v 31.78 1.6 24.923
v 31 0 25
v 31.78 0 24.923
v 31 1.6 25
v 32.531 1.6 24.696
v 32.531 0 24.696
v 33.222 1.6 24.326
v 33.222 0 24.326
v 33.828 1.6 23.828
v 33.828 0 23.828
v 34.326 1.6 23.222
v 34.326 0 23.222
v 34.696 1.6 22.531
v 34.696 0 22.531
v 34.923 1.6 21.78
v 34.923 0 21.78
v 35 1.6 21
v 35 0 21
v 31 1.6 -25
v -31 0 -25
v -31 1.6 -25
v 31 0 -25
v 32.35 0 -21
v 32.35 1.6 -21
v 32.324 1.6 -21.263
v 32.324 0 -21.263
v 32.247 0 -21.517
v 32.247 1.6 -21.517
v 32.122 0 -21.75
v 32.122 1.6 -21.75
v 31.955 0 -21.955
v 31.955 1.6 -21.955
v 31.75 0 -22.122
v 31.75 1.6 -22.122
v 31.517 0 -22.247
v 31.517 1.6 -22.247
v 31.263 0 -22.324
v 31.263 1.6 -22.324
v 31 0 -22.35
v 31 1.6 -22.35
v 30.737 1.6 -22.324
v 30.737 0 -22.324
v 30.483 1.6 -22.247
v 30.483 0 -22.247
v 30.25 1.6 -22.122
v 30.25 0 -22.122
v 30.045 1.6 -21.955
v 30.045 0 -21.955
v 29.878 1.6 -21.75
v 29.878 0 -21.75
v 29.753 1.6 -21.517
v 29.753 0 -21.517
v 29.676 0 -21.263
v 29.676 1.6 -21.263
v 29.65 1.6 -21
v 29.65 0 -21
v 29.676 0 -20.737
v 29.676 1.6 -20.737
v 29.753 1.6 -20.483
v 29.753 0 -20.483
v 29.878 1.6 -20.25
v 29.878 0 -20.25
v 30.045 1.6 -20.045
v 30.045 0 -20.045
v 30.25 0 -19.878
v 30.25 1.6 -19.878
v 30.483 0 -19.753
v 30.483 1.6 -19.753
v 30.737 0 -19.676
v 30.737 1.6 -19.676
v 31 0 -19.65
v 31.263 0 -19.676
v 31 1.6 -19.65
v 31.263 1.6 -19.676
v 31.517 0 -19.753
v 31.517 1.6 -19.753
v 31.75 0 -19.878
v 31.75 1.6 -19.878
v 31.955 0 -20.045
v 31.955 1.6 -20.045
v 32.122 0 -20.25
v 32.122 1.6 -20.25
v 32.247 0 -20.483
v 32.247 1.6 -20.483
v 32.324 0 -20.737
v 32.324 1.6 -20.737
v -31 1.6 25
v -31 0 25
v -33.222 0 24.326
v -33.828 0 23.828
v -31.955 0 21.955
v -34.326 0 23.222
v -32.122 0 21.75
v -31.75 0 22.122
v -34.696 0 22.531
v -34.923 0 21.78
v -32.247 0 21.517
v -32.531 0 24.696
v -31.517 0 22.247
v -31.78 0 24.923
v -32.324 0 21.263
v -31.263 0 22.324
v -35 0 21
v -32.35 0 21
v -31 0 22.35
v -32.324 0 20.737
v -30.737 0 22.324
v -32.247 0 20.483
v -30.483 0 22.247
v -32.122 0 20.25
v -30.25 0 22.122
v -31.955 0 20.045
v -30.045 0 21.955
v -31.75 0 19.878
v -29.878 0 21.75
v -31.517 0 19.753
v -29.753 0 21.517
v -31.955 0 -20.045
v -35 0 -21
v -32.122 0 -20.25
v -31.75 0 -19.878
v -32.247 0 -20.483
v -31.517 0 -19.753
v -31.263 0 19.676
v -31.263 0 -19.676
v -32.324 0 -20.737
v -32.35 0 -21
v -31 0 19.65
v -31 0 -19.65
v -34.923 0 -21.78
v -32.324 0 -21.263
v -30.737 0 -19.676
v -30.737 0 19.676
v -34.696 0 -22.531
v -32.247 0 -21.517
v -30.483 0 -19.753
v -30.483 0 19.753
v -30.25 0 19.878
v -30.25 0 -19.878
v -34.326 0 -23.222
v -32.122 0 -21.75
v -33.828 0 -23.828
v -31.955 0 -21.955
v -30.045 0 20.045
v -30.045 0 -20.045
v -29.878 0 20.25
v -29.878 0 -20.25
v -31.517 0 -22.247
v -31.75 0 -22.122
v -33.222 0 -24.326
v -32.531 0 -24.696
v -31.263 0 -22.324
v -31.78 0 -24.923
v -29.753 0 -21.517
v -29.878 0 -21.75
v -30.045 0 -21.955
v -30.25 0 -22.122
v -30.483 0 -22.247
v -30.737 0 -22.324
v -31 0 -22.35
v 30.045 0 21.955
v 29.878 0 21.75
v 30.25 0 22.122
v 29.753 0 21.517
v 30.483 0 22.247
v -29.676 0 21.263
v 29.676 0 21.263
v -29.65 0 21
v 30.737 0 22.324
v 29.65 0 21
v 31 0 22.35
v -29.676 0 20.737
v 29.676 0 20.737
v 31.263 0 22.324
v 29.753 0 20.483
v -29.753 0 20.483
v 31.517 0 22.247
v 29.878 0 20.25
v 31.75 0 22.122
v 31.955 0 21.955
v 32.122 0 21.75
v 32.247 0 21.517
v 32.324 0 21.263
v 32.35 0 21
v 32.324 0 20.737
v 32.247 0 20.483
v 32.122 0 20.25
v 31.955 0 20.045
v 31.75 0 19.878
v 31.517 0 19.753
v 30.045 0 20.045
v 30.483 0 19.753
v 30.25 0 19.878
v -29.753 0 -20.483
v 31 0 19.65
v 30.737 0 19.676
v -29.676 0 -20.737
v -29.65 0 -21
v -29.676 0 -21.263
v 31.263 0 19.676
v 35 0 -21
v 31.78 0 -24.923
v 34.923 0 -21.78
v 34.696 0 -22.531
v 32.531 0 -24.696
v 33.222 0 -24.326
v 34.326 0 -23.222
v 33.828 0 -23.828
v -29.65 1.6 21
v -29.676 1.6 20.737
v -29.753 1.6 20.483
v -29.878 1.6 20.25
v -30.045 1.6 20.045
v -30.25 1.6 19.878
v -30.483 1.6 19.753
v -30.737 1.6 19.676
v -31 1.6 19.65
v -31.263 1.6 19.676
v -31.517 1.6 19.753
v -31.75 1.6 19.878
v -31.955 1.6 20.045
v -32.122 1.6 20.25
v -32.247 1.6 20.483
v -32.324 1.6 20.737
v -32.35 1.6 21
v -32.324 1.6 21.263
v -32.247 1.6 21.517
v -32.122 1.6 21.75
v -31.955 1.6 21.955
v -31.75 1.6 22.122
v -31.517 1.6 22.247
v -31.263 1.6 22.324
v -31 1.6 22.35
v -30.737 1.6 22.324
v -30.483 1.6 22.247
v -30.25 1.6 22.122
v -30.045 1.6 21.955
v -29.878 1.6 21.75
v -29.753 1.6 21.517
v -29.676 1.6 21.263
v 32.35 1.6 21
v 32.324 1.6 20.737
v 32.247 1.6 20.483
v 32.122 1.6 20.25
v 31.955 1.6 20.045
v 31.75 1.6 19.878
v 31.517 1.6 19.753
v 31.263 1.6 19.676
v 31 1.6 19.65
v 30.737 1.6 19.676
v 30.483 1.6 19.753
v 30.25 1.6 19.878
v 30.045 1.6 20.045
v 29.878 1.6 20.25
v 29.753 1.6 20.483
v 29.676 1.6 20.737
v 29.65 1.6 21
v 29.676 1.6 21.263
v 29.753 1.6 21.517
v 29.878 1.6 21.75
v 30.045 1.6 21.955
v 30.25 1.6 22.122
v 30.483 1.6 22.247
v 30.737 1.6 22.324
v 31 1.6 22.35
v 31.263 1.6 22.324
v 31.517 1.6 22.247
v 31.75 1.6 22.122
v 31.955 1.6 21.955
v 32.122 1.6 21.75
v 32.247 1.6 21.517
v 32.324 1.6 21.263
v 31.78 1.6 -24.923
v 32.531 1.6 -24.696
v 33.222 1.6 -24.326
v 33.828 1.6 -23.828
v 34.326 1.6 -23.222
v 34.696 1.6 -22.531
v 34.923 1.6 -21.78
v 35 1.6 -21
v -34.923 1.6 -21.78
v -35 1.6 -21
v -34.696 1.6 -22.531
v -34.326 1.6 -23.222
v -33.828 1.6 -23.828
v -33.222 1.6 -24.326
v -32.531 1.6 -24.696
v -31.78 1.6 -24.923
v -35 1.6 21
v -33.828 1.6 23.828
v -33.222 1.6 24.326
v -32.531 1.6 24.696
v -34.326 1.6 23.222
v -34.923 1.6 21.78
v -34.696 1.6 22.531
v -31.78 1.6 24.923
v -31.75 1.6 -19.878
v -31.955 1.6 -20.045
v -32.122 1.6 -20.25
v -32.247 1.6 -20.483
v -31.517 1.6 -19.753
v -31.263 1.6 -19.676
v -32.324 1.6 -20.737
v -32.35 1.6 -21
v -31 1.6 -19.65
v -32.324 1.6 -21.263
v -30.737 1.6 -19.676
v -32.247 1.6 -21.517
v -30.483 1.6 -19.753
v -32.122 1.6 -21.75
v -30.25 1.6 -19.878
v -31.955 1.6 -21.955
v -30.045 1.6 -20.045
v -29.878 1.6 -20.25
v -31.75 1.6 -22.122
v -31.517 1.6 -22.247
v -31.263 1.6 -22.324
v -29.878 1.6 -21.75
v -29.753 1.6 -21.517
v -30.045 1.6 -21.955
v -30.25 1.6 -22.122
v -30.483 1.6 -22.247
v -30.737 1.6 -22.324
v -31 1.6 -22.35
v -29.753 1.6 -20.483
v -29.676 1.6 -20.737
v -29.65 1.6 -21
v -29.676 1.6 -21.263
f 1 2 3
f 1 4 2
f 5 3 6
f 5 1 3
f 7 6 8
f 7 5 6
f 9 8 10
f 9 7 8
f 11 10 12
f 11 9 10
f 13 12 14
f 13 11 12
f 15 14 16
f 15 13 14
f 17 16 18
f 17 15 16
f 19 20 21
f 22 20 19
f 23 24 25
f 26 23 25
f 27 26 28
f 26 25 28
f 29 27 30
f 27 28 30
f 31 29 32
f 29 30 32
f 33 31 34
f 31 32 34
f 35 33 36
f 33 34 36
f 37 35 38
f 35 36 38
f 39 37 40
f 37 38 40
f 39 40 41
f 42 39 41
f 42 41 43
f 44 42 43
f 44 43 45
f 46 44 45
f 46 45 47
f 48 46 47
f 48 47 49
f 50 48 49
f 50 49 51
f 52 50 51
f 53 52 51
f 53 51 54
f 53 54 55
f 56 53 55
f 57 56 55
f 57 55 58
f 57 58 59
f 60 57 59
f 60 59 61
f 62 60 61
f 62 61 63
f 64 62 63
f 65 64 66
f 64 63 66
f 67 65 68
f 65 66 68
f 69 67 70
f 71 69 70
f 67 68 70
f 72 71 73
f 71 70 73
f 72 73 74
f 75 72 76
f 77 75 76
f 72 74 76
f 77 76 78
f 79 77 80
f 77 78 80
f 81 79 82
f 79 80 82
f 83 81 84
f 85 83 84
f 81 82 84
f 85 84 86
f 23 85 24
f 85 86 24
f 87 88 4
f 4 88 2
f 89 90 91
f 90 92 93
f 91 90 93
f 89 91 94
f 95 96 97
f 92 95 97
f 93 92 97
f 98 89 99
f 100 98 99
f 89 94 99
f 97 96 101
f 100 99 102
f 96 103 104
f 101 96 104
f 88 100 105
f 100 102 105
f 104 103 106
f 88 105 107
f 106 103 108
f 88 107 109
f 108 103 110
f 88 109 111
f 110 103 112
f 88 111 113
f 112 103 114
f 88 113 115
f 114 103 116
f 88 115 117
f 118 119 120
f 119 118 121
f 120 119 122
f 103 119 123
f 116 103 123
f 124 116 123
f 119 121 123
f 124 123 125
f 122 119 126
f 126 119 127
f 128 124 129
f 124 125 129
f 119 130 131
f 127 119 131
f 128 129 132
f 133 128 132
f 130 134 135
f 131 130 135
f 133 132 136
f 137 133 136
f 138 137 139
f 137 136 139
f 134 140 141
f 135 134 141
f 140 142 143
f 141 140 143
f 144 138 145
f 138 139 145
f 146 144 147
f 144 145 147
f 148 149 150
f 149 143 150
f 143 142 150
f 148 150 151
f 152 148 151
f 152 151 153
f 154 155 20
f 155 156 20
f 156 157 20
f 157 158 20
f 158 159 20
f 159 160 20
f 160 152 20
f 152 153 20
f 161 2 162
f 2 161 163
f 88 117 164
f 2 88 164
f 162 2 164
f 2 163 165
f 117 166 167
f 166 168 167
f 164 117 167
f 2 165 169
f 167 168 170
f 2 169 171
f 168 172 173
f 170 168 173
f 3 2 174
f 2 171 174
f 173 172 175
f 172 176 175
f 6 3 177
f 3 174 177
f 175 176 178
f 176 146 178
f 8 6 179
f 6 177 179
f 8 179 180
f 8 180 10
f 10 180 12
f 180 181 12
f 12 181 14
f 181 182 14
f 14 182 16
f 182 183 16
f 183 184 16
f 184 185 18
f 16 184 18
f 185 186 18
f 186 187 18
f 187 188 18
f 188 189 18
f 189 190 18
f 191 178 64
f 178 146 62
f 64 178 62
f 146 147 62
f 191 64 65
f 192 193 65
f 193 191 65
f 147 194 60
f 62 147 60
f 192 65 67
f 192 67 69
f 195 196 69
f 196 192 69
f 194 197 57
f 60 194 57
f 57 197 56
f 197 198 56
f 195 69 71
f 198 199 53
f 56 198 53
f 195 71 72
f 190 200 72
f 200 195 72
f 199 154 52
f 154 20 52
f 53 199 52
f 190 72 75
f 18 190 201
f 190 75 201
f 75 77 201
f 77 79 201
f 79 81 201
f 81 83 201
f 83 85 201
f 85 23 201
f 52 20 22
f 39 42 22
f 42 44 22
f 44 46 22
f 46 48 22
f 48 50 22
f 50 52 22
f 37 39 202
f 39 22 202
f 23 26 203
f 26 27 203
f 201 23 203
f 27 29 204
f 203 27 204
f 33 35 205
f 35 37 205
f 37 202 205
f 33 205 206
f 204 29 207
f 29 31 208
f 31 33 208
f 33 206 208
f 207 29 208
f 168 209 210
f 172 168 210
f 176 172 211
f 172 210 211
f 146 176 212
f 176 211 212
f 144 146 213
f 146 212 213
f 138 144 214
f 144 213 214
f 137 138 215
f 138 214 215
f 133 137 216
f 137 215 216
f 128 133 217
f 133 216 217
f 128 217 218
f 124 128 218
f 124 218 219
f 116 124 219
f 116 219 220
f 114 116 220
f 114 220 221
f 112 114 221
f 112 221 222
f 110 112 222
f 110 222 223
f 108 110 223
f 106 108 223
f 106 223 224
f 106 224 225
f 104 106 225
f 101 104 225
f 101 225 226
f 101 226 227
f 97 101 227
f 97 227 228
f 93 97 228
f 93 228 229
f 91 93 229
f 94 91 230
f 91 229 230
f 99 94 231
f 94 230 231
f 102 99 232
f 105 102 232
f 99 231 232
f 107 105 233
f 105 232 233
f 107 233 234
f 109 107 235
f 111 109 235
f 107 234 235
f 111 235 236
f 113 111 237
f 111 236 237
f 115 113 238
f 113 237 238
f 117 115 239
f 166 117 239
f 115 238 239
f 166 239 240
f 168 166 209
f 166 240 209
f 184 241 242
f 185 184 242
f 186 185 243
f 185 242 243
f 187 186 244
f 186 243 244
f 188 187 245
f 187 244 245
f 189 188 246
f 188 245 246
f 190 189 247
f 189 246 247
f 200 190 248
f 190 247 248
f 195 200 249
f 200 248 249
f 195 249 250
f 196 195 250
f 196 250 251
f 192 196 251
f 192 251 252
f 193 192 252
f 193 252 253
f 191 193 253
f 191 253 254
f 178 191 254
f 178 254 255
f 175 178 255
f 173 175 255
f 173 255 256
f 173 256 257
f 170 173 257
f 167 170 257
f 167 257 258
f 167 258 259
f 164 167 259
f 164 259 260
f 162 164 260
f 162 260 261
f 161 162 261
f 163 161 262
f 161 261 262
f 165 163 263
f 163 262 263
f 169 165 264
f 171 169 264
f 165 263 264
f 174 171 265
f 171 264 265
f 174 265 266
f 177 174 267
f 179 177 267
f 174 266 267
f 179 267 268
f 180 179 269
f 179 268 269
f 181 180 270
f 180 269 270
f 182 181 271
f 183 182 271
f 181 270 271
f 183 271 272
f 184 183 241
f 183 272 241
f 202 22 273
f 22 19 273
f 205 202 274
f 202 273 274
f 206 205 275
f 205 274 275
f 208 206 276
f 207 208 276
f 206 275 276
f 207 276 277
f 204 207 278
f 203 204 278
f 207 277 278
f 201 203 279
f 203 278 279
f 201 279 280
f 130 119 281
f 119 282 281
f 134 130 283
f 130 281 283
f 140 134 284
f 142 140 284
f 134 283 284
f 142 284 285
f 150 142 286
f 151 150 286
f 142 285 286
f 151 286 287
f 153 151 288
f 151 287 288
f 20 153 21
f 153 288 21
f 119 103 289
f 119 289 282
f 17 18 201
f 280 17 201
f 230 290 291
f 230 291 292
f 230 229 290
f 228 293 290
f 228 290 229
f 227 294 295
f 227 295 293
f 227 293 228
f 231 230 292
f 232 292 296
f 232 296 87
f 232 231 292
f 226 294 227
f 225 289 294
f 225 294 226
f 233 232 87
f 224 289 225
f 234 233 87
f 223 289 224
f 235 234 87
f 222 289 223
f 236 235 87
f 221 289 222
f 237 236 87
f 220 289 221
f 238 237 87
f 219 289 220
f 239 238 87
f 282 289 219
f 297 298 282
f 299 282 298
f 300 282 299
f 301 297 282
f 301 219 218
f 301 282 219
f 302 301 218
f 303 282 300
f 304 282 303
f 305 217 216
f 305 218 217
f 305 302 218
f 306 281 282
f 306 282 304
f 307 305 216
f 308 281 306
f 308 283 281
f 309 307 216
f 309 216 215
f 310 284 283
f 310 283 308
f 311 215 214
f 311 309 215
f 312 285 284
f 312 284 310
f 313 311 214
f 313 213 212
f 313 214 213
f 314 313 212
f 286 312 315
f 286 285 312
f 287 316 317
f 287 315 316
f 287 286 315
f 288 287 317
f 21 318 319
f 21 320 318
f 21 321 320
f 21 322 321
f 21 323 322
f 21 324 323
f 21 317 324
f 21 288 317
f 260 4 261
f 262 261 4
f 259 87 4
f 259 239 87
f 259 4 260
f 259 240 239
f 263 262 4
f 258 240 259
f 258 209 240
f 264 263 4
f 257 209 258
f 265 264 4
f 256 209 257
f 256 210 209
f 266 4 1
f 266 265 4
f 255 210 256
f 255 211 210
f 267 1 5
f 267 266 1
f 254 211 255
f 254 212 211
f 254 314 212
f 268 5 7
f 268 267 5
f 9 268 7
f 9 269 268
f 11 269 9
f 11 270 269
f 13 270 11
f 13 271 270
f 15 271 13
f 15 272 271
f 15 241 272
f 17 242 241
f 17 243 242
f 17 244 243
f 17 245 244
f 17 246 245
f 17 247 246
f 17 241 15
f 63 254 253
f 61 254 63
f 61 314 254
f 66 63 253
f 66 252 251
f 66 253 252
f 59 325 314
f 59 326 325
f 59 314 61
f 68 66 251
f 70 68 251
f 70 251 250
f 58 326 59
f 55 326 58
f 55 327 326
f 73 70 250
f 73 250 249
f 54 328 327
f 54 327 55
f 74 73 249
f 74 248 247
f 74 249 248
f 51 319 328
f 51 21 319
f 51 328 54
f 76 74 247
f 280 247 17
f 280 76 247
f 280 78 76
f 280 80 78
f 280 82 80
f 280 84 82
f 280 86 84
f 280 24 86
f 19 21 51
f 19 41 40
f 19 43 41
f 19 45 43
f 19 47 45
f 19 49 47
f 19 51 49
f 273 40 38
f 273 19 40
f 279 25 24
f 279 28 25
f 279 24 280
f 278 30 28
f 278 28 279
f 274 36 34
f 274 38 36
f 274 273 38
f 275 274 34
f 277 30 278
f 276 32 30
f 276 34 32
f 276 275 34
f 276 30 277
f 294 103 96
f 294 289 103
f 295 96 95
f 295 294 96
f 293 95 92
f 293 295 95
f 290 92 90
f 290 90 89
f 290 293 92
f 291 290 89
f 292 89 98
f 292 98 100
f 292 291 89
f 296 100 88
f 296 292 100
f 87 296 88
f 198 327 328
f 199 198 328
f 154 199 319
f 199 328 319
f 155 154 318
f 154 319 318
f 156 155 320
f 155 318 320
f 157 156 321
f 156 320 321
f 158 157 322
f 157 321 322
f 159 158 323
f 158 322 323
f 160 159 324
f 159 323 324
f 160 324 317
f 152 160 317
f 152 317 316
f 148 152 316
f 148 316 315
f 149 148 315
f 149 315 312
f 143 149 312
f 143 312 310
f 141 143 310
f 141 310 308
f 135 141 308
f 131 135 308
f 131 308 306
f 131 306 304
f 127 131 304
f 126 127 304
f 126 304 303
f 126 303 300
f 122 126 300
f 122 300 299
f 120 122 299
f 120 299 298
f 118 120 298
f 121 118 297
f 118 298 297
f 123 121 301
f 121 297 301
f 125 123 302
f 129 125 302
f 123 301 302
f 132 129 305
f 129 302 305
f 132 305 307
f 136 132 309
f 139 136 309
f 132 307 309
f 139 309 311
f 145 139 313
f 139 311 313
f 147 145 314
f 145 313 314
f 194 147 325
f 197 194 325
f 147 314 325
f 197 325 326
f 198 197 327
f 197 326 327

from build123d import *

# Parameters (mm, degrees)
SKETCH1_W           = 70
SKETCH1_H           = 50
BOSS_EXTRUDE1_DEPTH = 1.6
SKETCH2_R           = 1.35
CUT_EXTRUDE1_DEPTH  = 2.6
FILLET1_R           = 4


with BuildPart() as part:
    # Sketch1 → Boss-Extrude1 (new body)
    with BuildSketch(Plane(origin=(0, 0, 0), x_dir=(1, 0, 0), z_dir=(0, 1, 0))):
        Rectangle(SKETCH1_W, SKETCH1_H)
    extrude(amount=BOSS_EXTRUDE1_DEPTH)

    # Sketch2 → Cut-Extrude1 (cut, through all)
    with BuildSketch(Plane(origin=(0, 1.6, 0), x_dir=(1, 0, 0), z_dir=(0, 1, 0))):
        with Locations((-31, 21)):
            Circle(SKETCH2_R)
        with Locations((31, 21)):
            Circle(SKETCH2_R)
        with Locations((31, -21)):
            Circle(SKETCH2_R)
        with Locations((-31, -21)):
            Circle(SKETCH2_R)
    extrude(amount=-CUT_EXTRUDE1_DEPTH, mode=Mode.SUBTRACT)

    # Fillet1
    fillet1_edges = [part.edges().sort_by_distance(p)[0] for p in [
        (35, 0.8, 25),
        (-35, 0.8, 25),
        (-35, 0.8, -25),
        (35, 0.8, -25),
    ]]
    fillet(fillet1_edges, radius=FILLET1_R)


solid = part.part
